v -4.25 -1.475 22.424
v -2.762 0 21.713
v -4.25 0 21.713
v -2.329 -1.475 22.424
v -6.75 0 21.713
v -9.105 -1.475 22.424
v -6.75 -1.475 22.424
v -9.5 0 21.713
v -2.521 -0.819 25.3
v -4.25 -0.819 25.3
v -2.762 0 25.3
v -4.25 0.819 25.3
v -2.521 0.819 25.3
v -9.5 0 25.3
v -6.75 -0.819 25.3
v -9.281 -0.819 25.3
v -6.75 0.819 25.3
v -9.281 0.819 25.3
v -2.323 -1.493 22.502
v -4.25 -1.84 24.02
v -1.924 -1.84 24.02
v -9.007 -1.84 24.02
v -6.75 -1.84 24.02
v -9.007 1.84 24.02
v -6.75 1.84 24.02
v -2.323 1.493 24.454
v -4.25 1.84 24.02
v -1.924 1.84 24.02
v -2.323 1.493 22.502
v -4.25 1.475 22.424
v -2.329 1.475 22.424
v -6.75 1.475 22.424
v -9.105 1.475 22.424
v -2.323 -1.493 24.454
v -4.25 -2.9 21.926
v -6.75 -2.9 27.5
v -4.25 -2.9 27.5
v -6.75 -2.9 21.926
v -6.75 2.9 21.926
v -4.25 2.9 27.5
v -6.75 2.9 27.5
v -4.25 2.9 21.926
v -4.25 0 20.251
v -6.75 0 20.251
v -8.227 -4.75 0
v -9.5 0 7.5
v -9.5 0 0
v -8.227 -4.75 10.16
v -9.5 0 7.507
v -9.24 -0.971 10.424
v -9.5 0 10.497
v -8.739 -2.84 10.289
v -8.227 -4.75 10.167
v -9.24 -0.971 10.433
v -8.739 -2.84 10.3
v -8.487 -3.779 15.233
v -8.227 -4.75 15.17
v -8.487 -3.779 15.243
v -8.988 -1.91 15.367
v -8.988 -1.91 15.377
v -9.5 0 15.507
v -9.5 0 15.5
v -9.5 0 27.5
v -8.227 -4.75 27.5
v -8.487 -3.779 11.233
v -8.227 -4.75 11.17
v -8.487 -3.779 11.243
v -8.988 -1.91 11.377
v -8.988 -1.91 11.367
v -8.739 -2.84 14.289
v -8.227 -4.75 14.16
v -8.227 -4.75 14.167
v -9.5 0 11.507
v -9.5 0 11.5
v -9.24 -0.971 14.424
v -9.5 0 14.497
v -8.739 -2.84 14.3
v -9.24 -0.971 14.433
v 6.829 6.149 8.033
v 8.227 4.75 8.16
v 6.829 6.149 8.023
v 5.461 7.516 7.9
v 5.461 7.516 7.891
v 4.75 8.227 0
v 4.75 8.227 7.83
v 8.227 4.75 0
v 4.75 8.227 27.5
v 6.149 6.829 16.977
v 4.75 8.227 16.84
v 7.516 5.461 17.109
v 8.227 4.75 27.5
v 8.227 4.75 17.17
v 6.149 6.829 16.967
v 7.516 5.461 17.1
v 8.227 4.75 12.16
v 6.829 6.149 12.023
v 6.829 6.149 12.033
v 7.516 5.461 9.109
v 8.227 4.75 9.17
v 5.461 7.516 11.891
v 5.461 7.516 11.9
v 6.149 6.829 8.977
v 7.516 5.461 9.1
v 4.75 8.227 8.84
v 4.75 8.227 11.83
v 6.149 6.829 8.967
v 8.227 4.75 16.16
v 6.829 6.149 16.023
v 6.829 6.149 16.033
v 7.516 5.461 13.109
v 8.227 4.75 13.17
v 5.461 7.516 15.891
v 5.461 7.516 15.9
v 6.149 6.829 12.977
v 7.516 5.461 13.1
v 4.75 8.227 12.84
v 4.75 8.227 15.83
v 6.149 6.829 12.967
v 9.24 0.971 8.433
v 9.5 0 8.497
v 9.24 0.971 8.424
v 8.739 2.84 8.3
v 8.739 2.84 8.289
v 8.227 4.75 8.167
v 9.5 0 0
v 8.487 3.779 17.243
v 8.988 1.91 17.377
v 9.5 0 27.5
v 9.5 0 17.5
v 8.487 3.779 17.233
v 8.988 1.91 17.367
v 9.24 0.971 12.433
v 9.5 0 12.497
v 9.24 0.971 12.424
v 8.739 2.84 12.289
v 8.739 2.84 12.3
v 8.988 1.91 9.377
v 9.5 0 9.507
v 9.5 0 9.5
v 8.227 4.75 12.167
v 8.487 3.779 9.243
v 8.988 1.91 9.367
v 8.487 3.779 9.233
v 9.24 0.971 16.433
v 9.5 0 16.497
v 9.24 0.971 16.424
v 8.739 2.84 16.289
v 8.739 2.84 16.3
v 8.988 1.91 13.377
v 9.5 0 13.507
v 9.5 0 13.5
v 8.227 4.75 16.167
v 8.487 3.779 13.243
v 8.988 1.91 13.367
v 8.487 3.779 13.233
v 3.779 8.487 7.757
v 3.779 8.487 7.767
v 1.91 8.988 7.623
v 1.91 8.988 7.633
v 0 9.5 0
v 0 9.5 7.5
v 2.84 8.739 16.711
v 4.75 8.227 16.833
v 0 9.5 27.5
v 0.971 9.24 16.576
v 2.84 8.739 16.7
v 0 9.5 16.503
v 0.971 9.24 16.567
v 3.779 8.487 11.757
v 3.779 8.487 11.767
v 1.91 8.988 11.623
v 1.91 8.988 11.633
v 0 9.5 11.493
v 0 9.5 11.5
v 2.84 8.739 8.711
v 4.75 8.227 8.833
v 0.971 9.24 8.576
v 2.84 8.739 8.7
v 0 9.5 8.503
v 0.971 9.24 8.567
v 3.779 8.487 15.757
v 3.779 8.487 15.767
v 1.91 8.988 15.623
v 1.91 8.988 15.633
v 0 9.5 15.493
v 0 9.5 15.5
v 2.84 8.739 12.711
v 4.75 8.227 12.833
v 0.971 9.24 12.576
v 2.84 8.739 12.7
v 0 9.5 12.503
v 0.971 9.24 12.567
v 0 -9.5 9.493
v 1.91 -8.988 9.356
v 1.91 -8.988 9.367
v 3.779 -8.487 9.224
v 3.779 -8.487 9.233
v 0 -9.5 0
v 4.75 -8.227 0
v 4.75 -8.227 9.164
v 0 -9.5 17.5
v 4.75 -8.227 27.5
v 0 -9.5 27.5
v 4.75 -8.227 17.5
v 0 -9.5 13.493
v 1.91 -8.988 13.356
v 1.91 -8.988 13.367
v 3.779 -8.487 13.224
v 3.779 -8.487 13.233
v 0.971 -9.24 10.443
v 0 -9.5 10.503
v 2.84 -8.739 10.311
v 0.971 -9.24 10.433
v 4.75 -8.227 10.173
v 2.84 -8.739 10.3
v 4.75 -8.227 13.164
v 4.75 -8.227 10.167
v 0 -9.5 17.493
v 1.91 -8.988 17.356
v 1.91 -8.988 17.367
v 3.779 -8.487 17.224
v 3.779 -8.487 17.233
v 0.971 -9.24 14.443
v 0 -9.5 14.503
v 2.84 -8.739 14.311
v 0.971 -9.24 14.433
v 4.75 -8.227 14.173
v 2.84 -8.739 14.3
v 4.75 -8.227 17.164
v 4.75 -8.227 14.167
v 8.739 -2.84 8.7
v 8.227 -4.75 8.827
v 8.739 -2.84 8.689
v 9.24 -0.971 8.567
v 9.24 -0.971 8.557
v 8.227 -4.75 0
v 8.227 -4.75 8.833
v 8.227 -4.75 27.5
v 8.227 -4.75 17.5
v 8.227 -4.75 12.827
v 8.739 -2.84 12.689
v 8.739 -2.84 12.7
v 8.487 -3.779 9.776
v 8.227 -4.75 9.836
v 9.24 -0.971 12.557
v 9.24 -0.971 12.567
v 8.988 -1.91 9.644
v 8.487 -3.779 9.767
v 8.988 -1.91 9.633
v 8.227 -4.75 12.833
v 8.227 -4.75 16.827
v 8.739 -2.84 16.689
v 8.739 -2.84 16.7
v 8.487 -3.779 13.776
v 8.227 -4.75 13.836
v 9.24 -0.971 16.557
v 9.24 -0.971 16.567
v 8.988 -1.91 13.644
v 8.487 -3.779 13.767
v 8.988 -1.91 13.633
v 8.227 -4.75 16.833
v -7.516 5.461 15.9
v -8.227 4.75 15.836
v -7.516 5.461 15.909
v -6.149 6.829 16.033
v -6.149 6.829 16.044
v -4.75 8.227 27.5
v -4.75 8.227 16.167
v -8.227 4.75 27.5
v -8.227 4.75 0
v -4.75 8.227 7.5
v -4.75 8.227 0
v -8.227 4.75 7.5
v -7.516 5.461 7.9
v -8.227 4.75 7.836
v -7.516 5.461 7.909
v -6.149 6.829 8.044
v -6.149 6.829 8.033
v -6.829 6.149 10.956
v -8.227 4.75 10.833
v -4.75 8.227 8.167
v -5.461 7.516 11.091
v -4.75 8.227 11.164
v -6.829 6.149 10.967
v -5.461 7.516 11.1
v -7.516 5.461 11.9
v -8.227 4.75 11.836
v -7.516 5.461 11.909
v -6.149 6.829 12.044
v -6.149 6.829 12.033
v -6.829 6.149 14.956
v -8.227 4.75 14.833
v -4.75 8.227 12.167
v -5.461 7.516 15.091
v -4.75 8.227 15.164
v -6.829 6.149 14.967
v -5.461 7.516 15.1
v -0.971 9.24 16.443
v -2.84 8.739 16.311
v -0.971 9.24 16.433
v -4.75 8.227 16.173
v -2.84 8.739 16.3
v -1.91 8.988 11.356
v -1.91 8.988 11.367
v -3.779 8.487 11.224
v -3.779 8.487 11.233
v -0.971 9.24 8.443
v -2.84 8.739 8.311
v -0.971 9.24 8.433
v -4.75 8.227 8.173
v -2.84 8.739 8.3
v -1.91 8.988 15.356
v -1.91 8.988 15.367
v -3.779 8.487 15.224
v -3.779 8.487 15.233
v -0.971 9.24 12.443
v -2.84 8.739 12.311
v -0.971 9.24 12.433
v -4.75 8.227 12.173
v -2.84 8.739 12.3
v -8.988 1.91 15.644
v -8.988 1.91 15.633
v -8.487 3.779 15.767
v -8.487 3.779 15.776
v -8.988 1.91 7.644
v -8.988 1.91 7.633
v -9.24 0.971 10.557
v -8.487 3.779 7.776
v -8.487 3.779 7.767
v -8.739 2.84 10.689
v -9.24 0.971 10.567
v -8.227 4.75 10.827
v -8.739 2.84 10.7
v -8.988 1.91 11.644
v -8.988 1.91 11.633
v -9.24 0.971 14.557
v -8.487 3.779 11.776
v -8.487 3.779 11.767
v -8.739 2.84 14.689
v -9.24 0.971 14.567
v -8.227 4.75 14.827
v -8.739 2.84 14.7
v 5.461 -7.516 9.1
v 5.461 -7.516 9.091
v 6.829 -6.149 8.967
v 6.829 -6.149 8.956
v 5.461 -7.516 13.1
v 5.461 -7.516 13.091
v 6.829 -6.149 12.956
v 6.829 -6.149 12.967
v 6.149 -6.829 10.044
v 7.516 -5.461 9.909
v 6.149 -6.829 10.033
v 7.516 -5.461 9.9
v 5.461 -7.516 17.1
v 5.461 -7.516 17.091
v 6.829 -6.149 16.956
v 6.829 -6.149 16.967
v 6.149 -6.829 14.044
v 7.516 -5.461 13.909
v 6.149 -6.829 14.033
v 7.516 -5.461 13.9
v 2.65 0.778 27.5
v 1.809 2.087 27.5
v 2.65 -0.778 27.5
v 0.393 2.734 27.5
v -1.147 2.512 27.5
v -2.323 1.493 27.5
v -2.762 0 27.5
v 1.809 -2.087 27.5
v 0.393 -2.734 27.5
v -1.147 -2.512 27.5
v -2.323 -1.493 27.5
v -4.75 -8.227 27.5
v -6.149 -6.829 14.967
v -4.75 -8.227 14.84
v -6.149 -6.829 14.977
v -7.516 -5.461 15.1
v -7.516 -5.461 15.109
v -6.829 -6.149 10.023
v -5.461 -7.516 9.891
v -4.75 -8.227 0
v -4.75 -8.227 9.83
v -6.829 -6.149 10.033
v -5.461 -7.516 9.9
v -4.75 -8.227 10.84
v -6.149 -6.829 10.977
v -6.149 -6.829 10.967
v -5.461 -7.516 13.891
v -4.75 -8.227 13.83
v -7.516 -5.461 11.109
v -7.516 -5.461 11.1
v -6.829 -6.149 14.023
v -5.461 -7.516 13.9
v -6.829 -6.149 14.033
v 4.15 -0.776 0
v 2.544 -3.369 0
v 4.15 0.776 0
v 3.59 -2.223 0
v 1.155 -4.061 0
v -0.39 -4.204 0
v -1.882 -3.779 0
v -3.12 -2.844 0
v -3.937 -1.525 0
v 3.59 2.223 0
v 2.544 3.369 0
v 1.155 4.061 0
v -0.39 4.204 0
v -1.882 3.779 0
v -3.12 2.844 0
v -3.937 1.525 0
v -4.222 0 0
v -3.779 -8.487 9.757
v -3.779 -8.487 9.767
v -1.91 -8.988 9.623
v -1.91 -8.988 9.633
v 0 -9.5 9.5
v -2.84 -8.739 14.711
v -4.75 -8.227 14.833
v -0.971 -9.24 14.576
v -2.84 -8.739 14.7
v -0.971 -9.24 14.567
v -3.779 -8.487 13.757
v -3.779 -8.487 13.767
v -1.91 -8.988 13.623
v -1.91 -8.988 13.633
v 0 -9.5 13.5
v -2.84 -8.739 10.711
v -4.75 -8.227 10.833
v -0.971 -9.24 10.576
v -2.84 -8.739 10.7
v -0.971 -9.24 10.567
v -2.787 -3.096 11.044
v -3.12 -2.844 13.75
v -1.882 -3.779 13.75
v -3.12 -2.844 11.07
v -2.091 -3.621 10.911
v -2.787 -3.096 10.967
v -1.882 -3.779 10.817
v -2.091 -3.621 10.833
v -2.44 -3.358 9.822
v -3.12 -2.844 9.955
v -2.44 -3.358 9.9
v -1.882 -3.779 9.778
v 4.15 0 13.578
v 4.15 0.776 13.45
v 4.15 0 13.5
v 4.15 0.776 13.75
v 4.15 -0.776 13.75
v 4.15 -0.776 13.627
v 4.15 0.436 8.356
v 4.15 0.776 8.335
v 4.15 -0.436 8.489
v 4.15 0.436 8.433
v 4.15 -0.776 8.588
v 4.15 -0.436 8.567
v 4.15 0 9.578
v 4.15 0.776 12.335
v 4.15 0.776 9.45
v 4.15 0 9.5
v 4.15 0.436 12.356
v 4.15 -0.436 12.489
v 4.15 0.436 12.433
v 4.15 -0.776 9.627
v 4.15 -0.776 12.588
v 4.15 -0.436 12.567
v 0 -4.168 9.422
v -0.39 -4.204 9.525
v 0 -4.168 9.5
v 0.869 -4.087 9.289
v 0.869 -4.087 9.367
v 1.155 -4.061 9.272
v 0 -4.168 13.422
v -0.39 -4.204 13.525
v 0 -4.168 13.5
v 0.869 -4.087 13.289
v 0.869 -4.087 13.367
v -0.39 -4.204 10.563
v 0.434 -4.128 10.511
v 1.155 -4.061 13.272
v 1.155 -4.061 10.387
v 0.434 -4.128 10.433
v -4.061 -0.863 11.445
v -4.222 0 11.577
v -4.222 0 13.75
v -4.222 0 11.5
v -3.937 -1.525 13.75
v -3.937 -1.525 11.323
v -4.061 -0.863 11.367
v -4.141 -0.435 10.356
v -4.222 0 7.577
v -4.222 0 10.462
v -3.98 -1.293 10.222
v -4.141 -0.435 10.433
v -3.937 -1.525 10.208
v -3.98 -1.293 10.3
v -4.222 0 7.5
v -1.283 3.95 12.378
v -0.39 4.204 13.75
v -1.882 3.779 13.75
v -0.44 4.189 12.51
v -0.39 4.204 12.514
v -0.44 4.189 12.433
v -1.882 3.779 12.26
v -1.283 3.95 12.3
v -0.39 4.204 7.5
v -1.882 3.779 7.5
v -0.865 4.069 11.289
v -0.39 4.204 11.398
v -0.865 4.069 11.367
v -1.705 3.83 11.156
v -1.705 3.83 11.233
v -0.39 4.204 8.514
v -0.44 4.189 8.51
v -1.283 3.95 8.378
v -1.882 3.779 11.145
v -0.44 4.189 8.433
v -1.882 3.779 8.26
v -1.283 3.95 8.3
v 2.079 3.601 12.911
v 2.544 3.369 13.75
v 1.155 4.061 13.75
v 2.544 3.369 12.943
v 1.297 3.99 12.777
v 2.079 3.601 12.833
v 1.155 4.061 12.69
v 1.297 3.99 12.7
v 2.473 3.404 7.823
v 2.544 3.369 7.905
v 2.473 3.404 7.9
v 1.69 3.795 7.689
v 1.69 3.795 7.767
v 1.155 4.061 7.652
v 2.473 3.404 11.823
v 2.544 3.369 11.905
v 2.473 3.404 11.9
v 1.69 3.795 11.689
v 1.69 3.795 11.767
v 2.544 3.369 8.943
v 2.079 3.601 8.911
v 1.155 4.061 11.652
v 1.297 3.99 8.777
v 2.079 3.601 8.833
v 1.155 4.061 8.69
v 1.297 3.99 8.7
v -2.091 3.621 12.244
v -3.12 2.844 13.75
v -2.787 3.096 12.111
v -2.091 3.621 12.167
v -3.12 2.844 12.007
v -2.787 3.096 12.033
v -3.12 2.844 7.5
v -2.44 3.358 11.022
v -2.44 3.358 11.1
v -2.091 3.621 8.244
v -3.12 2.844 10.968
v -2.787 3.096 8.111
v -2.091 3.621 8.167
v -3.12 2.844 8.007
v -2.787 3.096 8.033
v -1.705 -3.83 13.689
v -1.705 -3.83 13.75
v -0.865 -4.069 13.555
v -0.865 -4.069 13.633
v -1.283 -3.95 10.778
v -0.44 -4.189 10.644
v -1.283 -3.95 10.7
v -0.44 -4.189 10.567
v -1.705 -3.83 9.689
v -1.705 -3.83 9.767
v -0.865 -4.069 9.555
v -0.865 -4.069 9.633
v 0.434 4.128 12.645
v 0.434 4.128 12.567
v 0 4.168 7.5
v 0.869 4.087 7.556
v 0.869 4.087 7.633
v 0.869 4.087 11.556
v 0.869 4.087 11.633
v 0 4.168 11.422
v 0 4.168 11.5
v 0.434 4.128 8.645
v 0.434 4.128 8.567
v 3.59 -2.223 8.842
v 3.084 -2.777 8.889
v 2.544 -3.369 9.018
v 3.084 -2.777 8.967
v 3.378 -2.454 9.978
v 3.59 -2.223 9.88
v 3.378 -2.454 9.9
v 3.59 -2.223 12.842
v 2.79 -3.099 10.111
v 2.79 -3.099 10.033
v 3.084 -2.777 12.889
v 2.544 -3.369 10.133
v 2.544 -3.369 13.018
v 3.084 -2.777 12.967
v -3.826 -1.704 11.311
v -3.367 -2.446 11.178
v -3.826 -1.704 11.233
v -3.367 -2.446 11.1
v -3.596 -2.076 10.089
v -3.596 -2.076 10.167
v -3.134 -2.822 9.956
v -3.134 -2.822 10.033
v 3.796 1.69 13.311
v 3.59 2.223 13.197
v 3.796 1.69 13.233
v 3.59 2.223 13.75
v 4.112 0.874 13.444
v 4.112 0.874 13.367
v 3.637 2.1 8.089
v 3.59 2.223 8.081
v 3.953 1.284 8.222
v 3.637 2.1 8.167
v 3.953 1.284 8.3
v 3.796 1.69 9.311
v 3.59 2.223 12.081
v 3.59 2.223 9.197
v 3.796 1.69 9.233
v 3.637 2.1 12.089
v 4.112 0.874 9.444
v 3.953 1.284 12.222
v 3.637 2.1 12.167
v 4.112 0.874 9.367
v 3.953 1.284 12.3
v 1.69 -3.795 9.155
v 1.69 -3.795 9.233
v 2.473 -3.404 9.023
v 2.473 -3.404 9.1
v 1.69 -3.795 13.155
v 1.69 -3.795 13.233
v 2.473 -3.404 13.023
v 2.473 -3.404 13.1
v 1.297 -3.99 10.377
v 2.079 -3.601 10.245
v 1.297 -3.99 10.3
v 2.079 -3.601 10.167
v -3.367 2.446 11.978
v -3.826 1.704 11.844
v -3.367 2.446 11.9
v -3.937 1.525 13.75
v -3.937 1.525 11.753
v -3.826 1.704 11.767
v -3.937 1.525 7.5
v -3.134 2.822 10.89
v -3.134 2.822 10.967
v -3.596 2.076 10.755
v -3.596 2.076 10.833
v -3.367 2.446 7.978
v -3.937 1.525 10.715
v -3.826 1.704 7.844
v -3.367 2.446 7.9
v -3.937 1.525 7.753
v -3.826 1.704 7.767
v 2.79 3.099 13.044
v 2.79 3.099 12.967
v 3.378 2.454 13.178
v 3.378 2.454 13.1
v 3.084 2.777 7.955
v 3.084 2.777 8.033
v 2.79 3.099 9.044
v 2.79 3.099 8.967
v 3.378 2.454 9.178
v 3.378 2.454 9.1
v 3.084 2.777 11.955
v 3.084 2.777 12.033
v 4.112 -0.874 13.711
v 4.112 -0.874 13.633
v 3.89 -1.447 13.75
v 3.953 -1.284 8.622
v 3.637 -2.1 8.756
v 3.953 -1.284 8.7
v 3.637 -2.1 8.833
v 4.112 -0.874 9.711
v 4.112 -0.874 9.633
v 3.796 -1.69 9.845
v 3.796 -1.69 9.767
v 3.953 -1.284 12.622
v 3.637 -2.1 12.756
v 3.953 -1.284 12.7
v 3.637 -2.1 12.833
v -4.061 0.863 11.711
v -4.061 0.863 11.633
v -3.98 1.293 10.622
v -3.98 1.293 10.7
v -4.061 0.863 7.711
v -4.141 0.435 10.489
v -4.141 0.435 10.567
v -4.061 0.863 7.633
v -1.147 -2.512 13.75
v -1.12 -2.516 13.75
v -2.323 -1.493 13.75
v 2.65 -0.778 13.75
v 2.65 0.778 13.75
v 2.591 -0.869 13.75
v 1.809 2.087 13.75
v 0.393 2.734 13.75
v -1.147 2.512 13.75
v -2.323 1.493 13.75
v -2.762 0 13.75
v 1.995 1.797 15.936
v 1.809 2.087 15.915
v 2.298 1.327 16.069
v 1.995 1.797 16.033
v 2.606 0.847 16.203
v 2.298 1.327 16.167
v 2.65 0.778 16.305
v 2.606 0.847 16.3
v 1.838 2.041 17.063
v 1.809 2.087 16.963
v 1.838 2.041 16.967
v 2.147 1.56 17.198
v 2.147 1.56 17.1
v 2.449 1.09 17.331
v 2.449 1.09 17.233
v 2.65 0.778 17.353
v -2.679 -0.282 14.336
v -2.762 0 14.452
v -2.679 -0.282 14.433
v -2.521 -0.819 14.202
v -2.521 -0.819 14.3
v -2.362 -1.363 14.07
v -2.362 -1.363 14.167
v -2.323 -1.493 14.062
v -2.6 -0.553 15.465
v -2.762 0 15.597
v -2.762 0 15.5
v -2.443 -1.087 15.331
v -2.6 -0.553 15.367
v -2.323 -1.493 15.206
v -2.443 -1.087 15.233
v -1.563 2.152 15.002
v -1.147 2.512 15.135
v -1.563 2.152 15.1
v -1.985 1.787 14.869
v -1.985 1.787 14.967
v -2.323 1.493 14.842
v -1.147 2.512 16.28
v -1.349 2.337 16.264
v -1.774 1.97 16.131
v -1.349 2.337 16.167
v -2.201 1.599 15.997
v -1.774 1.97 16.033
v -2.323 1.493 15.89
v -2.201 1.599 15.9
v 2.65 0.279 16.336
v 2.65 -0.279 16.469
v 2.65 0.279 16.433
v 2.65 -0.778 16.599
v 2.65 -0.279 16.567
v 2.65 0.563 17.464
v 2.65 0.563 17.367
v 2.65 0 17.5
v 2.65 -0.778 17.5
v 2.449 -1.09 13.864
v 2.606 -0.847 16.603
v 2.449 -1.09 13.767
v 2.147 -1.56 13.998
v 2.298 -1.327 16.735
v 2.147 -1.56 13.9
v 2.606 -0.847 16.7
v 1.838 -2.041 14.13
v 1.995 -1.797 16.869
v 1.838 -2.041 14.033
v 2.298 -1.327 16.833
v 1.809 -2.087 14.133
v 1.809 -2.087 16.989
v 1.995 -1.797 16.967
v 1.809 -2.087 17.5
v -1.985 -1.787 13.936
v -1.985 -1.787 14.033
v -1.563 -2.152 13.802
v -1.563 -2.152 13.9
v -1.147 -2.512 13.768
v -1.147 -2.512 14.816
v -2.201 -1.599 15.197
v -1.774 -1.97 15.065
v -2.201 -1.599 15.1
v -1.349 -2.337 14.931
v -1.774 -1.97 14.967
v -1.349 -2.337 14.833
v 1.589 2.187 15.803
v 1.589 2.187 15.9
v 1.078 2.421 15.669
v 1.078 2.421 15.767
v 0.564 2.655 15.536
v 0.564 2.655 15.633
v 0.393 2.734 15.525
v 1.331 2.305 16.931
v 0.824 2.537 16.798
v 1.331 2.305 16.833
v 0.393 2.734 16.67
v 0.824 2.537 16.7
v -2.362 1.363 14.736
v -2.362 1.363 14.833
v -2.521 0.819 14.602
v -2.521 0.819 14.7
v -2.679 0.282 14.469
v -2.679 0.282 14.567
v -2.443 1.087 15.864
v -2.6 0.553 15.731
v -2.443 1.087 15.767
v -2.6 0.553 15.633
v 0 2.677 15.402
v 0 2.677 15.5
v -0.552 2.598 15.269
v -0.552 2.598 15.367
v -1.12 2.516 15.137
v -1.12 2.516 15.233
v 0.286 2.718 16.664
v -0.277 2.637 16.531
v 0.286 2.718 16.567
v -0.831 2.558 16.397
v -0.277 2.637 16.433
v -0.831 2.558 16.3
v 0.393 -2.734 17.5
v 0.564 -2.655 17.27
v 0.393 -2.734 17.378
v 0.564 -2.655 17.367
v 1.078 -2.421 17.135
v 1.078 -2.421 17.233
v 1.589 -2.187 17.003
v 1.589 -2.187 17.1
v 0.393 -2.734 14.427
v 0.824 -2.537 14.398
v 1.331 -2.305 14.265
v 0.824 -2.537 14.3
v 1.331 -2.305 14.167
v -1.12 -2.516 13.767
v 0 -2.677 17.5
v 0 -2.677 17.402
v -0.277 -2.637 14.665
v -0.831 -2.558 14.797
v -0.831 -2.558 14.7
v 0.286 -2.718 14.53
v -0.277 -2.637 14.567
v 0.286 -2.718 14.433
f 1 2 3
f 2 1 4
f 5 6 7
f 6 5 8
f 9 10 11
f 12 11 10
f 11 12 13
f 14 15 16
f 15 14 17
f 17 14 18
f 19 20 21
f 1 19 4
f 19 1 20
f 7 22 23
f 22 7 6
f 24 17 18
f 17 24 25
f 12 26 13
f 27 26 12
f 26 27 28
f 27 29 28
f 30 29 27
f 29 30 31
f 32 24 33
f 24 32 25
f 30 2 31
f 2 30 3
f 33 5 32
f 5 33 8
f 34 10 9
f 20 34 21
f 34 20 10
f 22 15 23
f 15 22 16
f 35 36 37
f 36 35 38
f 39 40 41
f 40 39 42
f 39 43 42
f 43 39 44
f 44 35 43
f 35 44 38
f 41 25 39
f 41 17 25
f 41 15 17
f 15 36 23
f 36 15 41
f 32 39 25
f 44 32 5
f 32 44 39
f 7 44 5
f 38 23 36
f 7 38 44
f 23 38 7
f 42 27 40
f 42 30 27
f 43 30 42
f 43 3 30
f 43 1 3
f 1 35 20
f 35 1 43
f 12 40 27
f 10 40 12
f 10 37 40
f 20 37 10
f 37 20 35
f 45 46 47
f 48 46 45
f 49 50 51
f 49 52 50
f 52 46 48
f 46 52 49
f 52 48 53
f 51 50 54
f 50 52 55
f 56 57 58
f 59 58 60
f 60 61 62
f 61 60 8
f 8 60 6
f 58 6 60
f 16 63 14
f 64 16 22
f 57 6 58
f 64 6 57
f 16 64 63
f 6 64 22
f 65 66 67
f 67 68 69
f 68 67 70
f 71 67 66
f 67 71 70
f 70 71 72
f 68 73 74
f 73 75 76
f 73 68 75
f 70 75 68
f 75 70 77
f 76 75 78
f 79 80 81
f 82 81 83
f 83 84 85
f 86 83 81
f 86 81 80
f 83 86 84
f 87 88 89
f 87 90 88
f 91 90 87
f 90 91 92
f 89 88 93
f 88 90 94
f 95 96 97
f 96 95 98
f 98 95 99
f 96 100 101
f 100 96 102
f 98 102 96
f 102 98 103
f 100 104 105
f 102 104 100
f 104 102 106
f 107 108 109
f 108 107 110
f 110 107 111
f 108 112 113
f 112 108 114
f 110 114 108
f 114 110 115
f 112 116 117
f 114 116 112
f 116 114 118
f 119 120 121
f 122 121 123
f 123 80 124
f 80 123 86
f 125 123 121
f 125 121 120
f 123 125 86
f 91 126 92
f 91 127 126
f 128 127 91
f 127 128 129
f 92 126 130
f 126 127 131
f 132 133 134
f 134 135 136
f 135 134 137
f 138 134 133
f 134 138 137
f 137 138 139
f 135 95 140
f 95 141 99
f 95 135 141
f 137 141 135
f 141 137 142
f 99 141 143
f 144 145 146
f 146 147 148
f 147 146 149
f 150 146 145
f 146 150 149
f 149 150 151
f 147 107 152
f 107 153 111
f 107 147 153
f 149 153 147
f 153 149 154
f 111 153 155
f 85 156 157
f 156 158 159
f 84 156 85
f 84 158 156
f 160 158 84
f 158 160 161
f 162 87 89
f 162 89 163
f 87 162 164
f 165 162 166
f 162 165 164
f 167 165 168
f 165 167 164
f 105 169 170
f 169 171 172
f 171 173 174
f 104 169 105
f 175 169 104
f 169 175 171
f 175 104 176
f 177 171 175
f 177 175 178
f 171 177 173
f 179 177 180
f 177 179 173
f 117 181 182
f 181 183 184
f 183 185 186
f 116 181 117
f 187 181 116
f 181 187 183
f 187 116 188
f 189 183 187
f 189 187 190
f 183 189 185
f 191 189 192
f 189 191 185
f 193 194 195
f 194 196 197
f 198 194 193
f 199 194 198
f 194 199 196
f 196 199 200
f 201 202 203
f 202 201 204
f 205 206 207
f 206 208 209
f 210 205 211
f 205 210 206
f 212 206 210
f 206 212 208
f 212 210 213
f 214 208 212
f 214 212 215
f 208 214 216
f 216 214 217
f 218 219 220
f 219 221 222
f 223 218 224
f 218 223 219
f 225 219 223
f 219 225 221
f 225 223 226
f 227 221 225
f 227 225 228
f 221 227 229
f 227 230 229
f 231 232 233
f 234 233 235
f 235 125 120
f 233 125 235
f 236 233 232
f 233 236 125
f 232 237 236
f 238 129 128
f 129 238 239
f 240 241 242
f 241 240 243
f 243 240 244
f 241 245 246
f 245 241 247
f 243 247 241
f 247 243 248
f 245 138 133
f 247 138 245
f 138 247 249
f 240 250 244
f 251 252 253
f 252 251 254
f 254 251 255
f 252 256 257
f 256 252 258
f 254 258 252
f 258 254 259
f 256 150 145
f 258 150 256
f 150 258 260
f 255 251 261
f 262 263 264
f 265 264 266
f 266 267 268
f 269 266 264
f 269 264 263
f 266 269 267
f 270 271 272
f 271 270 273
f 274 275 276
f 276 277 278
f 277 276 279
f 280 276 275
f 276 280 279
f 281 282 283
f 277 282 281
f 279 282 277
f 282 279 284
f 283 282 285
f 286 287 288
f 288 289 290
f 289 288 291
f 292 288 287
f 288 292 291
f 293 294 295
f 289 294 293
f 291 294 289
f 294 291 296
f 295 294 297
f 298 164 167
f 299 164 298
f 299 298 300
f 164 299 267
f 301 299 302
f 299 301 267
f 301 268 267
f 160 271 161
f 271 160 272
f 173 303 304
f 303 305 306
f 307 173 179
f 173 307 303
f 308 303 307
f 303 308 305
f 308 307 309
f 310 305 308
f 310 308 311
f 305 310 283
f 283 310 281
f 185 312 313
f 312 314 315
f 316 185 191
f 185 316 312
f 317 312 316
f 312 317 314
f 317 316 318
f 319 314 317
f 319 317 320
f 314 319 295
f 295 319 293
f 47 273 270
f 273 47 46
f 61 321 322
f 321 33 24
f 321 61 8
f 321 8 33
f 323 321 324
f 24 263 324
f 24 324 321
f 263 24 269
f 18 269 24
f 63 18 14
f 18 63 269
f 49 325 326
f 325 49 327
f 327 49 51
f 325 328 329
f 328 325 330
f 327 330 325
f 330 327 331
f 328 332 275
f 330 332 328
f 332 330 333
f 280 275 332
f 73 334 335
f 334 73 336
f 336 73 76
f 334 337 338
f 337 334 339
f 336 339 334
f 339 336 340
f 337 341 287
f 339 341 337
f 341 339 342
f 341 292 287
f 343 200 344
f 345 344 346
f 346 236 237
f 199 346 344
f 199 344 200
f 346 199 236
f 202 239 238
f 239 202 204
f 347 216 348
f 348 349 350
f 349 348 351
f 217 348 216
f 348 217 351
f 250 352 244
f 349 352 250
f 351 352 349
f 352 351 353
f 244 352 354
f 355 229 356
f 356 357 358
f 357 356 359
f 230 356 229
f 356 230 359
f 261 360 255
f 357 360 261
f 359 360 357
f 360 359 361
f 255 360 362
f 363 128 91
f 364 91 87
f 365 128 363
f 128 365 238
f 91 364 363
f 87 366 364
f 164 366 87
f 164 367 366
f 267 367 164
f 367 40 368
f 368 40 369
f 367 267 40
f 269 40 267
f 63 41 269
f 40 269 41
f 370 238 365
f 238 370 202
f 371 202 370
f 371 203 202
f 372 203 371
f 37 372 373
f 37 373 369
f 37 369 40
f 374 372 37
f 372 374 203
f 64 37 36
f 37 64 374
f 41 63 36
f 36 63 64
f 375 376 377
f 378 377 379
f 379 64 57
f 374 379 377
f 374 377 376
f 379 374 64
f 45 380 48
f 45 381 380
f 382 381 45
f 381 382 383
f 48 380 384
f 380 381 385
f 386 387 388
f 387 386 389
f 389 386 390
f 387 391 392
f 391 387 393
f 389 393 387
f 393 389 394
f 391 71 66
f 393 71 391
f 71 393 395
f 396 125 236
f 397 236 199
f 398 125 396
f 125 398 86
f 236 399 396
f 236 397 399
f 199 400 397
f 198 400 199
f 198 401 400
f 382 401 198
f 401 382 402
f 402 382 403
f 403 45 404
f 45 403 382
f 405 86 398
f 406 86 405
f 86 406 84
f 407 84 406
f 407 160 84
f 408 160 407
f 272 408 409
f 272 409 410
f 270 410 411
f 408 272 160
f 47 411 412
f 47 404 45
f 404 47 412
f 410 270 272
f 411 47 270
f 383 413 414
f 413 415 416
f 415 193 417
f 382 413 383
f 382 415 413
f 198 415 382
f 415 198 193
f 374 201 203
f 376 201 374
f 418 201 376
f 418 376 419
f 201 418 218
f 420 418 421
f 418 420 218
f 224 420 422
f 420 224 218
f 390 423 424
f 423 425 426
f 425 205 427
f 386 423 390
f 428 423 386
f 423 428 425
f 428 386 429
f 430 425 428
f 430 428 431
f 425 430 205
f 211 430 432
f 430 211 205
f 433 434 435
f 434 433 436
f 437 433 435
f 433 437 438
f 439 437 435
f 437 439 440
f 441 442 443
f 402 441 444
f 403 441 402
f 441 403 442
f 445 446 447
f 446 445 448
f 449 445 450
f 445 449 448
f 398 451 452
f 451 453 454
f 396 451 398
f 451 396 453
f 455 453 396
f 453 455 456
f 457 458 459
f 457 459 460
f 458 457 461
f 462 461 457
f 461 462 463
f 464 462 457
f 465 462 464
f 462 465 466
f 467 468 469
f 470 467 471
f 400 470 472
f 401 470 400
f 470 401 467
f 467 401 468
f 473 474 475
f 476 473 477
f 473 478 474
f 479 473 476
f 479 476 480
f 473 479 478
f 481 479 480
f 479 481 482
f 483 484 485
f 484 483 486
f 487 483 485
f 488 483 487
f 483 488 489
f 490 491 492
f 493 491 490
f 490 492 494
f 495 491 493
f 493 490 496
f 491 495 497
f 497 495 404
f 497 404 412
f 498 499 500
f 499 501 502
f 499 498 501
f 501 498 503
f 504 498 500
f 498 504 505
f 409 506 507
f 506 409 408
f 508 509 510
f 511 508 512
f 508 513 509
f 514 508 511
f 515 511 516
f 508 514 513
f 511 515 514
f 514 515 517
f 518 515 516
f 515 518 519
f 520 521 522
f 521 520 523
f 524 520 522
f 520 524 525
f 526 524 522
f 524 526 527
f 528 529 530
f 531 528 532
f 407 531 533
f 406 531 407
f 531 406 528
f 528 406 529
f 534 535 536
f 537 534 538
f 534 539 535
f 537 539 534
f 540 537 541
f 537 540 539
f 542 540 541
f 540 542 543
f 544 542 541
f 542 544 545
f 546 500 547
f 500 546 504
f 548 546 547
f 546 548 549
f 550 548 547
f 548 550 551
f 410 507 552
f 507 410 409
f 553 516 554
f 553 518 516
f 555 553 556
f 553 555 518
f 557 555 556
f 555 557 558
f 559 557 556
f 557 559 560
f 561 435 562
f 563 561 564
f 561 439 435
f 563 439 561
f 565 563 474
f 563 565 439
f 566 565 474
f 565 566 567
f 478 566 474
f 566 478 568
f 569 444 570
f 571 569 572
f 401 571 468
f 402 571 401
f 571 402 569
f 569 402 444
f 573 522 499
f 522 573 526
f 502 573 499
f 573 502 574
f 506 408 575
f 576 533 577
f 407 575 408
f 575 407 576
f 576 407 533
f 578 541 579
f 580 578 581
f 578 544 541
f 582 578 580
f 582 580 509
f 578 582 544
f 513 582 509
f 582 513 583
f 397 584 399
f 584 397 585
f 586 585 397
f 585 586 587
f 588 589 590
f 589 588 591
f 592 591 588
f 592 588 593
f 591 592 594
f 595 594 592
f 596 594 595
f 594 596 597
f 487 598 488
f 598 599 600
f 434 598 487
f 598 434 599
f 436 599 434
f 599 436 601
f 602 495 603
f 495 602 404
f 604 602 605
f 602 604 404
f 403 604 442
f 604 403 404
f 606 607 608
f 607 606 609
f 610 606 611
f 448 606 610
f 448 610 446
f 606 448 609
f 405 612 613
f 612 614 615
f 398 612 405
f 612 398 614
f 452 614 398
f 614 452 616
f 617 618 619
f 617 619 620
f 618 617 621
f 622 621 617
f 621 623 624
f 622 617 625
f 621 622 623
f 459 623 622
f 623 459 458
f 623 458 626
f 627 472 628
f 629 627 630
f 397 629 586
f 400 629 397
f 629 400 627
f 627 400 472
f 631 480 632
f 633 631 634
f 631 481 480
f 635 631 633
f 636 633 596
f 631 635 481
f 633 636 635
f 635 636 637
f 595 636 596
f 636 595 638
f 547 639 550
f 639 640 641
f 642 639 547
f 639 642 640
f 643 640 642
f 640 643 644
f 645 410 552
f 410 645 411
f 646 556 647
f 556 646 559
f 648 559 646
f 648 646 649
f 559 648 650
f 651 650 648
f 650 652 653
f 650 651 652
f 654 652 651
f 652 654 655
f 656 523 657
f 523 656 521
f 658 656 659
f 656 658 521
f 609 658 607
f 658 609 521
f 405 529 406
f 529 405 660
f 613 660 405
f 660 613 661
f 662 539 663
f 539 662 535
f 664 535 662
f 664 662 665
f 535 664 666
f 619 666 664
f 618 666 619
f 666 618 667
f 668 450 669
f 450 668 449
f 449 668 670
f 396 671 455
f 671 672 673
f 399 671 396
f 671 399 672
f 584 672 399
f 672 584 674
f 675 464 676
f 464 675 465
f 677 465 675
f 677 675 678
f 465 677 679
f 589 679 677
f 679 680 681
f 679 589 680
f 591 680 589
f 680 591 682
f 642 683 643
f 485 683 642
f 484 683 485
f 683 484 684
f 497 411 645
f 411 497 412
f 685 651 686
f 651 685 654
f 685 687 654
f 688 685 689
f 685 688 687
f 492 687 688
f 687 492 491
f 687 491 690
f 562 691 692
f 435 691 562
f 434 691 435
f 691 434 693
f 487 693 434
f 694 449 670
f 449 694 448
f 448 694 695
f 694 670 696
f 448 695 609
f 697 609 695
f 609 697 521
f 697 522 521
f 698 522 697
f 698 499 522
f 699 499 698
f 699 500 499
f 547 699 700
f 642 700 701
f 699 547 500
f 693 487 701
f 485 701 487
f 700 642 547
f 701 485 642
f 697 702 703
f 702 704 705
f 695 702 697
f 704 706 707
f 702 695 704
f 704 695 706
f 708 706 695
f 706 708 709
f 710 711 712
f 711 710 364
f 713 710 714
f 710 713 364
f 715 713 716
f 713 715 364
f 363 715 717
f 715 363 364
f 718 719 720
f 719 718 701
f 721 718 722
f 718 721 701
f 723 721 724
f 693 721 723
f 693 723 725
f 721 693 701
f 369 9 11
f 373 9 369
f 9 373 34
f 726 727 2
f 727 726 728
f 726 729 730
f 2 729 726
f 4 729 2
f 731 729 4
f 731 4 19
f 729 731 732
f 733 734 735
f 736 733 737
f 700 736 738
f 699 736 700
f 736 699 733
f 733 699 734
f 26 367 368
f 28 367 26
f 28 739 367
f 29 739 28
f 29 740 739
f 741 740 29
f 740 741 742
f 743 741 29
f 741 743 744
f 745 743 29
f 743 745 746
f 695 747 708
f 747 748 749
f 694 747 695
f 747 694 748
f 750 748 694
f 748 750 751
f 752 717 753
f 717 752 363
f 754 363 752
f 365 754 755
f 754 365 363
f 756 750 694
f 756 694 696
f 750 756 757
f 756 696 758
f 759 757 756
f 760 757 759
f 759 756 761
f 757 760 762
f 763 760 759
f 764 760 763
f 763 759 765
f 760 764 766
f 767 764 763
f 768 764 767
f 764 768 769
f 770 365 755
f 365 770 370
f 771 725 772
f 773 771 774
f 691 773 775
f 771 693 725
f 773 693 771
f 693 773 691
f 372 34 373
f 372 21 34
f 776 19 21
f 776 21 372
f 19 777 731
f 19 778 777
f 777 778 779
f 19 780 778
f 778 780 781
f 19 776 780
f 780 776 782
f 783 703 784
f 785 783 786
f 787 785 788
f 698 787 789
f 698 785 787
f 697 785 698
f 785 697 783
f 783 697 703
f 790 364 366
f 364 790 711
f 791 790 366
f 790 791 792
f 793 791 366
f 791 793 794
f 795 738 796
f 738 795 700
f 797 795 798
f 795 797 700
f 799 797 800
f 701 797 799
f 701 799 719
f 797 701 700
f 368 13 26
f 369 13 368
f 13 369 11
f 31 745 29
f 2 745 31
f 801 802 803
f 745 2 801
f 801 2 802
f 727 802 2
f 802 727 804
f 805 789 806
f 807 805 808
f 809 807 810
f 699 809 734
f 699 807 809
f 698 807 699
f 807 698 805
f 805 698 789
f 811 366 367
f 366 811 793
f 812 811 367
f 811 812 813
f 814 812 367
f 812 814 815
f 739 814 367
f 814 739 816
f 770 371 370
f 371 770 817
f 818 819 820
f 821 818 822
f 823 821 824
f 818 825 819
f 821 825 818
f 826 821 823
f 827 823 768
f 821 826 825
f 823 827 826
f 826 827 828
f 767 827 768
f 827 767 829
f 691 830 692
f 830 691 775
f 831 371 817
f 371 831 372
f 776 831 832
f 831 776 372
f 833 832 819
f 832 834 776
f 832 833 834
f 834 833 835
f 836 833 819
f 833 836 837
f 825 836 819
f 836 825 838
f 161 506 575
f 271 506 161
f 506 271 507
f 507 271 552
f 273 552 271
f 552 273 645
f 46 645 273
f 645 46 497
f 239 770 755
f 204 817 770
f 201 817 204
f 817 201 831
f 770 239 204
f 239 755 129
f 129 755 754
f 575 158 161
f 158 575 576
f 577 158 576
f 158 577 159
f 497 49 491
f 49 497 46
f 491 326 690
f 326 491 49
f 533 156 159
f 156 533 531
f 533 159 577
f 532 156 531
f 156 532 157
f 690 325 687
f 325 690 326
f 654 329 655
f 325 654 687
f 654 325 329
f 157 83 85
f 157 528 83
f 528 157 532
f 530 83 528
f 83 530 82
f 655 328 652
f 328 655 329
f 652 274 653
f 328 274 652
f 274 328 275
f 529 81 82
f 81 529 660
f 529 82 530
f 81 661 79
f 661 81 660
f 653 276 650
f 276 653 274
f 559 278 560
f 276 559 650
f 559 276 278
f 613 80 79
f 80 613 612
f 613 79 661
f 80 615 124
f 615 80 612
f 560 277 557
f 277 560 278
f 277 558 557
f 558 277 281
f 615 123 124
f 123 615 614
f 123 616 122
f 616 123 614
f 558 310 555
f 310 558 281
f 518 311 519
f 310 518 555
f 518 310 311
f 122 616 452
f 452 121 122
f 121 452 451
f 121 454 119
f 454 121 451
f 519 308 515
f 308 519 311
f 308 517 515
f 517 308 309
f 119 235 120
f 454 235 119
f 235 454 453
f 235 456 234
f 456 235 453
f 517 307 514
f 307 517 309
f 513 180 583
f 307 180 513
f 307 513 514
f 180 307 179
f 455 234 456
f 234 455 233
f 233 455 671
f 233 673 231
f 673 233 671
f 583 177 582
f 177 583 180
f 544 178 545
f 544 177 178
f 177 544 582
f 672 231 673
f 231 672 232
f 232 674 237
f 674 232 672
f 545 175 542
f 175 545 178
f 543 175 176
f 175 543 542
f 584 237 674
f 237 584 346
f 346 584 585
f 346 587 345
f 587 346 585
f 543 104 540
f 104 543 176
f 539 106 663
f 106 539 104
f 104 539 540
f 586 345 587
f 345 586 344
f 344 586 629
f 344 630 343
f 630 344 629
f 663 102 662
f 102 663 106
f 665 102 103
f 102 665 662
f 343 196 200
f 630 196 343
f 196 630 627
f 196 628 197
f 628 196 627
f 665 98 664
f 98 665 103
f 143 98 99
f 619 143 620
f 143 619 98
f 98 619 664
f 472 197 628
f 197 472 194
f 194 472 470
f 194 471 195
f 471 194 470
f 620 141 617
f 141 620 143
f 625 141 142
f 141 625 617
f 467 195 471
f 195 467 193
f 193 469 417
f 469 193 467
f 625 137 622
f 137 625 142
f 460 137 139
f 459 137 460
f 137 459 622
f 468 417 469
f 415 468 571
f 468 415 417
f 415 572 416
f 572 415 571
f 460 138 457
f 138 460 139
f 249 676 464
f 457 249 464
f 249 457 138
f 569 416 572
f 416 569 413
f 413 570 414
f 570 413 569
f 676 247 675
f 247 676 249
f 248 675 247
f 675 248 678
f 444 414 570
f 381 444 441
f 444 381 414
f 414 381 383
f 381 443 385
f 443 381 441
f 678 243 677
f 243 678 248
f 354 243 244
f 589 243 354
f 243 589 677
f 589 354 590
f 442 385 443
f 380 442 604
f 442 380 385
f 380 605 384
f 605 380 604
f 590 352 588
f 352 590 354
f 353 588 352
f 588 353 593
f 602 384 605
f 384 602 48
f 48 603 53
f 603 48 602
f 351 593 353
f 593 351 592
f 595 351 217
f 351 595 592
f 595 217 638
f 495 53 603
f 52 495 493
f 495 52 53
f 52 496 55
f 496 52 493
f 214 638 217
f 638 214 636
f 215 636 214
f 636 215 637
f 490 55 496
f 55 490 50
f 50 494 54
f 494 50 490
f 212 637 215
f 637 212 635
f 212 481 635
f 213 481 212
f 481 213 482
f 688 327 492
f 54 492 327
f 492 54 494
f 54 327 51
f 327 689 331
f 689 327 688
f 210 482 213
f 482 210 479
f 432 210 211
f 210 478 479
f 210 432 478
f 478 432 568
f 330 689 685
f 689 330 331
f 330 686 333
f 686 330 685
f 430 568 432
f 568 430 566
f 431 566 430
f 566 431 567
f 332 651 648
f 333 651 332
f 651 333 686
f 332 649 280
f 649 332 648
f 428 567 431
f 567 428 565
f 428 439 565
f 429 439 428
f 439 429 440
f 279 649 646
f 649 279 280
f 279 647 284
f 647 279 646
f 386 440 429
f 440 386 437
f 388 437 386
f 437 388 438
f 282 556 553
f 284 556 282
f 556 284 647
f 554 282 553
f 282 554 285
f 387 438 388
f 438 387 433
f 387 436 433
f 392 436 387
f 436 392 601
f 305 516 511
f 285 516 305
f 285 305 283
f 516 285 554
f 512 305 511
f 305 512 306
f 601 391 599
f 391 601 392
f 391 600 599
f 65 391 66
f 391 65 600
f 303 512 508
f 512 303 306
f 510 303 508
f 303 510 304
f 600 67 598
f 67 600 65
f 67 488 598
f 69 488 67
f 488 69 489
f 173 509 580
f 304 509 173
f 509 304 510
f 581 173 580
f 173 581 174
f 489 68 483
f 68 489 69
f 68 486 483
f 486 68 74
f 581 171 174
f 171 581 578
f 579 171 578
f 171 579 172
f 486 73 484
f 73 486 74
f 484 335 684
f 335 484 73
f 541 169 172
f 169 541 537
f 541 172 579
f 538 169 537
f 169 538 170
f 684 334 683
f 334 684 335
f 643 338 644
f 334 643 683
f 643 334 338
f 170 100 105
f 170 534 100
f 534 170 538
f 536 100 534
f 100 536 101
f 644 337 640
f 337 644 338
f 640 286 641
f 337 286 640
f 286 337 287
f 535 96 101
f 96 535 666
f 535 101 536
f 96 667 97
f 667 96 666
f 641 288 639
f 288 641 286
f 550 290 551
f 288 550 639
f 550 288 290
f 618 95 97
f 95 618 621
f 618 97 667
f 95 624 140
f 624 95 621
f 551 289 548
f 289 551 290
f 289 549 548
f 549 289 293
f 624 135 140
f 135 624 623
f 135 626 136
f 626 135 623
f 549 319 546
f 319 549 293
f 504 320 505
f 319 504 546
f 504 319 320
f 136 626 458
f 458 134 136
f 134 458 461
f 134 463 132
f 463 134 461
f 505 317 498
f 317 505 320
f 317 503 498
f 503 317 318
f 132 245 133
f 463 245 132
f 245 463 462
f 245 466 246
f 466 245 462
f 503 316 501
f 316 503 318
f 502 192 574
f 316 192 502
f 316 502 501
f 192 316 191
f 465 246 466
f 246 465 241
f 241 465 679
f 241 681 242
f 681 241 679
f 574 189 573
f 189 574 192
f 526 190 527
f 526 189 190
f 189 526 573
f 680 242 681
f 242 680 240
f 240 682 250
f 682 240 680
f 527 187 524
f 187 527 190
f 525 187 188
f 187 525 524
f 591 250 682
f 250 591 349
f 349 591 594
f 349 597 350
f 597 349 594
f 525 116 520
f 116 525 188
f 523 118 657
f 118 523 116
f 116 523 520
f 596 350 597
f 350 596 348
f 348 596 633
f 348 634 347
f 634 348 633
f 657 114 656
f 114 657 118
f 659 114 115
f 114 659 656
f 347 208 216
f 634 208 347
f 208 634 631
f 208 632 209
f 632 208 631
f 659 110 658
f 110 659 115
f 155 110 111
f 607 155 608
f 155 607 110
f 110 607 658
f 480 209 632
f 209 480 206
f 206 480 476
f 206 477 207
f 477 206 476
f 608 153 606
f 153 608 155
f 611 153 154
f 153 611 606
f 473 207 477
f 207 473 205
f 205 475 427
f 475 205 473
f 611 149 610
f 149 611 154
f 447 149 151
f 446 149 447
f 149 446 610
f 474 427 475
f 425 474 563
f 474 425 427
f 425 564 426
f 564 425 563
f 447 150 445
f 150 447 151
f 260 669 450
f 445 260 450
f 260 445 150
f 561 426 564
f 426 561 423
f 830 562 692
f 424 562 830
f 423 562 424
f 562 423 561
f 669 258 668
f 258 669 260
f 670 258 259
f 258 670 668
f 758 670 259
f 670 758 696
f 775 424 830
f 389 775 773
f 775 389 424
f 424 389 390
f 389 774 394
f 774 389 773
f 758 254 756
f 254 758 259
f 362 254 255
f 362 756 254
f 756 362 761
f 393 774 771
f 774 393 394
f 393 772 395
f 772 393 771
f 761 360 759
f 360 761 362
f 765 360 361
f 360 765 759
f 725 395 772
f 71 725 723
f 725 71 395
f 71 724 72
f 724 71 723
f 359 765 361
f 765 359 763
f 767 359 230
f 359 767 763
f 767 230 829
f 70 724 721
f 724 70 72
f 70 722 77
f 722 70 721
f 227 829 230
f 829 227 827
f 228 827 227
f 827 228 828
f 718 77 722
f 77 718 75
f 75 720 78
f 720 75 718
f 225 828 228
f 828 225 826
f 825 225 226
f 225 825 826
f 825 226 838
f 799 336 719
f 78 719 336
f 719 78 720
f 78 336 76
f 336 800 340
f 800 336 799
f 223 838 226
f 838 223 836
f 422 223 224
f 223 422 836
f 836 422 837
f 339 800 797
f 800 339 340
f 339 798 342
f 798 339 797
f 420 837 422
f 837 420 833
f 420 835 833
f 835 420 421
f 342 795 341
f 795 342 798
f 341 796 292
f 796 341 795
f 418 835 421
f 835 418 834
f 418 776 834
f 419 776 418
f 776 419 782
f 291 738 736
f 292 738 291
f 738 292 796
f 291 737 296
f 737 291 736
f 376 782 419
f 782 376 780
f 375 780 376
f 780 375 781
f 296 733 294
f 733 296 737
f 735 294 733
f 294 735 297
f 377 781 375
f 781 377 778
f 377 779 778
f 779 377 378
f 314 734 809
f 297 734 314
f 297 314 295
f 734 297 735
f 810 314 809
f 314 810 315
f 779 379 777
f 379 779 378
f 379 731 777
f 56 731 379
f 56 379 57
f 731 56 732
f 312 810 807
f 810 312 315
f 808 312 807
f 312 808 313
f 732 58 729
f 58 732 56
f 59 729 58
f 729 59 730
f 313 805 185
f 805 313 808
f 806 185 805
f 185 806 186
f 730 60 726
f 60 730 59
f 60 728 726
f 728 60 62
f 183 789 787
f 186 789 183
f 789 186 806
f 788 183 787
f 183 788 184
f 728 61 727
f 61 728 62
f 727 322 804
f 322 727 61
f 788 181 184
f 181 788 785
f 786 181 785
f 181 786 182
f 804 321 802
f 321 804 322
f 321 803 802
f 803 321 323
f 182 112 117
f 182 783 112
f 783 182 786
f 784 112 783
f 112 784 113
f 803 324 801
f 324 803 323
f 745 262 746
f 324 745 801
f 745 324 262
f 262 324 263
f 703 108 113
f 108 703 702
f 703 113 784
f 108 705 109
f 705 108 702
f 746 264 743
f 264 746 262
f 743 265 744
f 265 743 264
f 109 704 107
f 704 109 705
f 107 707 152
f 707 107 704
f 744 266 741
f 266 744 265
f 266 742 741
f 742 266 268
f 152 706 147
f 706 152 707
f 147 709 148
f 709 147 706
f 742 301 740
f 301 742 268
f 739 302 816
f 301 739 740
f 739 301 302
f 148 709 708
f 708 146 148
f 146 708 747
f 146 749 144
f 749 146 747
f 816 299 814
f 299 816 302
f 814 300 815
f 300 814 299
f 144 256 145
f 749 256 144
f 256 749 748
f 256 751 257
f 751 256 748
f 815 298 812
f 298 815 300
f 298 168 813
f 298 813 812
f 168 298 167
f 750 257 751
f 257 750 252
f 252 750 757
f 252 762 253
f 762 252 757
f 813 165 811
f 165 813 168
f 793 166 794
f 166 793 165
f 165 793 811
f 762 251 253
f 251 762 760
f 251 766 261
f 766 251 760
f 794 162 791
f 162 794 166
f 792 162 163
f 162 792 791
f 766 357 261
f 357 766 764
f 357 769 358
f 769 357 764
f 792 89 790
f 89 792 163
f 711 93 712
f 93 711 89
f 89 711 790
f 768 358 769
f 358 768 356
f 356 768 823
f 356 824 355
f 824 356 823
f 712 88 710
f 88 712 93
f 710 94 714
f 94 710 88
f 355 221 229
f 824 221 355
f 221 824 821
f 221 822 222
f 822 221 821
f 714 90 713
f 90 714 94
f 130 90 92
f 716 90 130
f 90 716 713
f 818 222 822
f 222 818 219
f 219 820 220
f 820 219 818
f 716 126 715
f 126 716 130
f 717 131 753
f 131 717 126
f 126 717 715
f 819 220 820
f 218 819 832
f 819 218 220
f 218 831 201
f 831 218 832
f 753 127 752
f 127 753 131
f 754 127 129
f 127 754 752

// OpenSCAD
// file: configuration.scad
// PRUSA Mendel  
// Configuration file
// GNU GPL v2
// Josef Průša
// josefprusa@me.com
// prusadjs.cz
// http://www.reprap.org/wiki/Prusa_Mendel
// http://github.com/prusajr/PrusaMendel

// PLEASE SELECT ONE OF THE CONFIGURATIONS BELOW
// BY UN-COMMENTING IT

variant=0; //0 for metric
//variant=1; //1 for SAE
if(variant==0){
echo("variant: metric");
}else if(variant==1){
echo("variant: sae");
} else{
echo("WARNING: INVALID CONFIGURATION");
}


vars=[
//[m8_dia, m8_nut, m4_dia, m4_nut, m3_dia, m3_nut, bush_dia, mot_shaft, bush_rod, bush_outerdia, bush_length]
[8.3,16.4,4.3,9,3.3,7,11,5.3,8,16,11],//metric
[9,15.7,5.5,10.6,5.5,10.6,11.5,5.3,7.9375,16,11]//SAE
];

//BUSHING TYPE Can generate three versions
// 1 - regular old ones
// 2 - helical ones
// 3 - holders for brass or any other bought bushings
bushing_type = 2;

//Round corner diameter
round_corner_diameter = 8;

//X end parameters
axis_diameter_real = 4;
axis_diameter_larger = 4.2 ;
pressure_pad_height = 0.7;

//Thin wall size
layer_height = 0.4;
perimeter_width_over_thicknes = 1.6;
infill_widht_over_thickness = 1.55;
thin_wall = 2*(perimeter_width_over_thicknes*layer_height+infill_widht_over_thickness*layer_height);
if(thin_wall<2){
	echo("Check thin wall size, its below 2mm!");
}
echo(thin_wall);

//DO NOT TOUCH THIS SECTION!
m8_diameter = vars[variant][0];
m8_nut_diameter = vars[variant][1];
m4_diameter = vars[variant][2];
m4_nut_diameter = vars[variant][3];
m3_diameter = vars[variant][4];
m3_nut_diameter = vars[variant][5];
bushing_diameter = vars[variant][6];
motor_shaft=vars[variant][7];
bushing_rodsize = vars[variant][8];
bushing_outerDiameter = vars[variant][9];
bushing_lenght = vars[variant][10];


// MINI-HUXLEY VERSION (TODO, just place holder)
// include <configuration-huxley.scad>

// MEGA VERSION (TODO, just place holder)
// include <configuration-mega.scad>


// Some basic functions, probably should be somewhere else
module roundcorner(diameter){
	difference(){
		cube(size = [diameter,diameter,99], center = false);
		translate(v = [diameter, diameter, 0]) cylinder(h = 100, r=diameter, center=true);
	}
}
module polyhole(h, d) {
    n = max(round(2 * d),3);
    rotate([0,0,180])
        cylinder(h = h, r = (d / 2) / cos (180 / n), $fn = n);
}
// main file
include <configuration.scad>

coupling_height=27.5;
coupling_dia=19;
m3_nut=2.5;
m3_af=5.8;
m3_dia_clr=3.4;

module coupling()
{
	difference()
	{
		//body
		cylinder(h=coupling_height, r=coupling_dia/2, $fn=12);
		//m8 hole
		translate([0,0,-coupling_height*0.1]) polyhole(coupling_height*0.6, m8_diameter);
		//5mm hole for motor shaft
		translate([0,0,coupling_height*0.5]) polyhole(coupling_height*0.6, motor_shaft);
		//grub screw pocket
		translate([-(m3_nut+3),0,coupling_height-m3_af/2-1]) rotate([0,-90,0]) union()
			{
				translate([0,0,-coupling_dia/4]) polyhole(coupling_dia*0.6, m3_dia_clr);
				cylinder(h=m3_nut, r=m3_af/sqrt(3), center=true, $fn=6);
				translate([coupling_height/4,0,0]) cube([coupling_height*0.5,m3_af,m3_nut], center=true);
			}
		translate([0,0,7.5]) rotate([0,0,90])
			linear_extrude(height = 10, convexity = 10, twist = 900)
			translate([0, 0, 0])
			square(size=10);//circle(r = 4);
	}
}

coupling();
